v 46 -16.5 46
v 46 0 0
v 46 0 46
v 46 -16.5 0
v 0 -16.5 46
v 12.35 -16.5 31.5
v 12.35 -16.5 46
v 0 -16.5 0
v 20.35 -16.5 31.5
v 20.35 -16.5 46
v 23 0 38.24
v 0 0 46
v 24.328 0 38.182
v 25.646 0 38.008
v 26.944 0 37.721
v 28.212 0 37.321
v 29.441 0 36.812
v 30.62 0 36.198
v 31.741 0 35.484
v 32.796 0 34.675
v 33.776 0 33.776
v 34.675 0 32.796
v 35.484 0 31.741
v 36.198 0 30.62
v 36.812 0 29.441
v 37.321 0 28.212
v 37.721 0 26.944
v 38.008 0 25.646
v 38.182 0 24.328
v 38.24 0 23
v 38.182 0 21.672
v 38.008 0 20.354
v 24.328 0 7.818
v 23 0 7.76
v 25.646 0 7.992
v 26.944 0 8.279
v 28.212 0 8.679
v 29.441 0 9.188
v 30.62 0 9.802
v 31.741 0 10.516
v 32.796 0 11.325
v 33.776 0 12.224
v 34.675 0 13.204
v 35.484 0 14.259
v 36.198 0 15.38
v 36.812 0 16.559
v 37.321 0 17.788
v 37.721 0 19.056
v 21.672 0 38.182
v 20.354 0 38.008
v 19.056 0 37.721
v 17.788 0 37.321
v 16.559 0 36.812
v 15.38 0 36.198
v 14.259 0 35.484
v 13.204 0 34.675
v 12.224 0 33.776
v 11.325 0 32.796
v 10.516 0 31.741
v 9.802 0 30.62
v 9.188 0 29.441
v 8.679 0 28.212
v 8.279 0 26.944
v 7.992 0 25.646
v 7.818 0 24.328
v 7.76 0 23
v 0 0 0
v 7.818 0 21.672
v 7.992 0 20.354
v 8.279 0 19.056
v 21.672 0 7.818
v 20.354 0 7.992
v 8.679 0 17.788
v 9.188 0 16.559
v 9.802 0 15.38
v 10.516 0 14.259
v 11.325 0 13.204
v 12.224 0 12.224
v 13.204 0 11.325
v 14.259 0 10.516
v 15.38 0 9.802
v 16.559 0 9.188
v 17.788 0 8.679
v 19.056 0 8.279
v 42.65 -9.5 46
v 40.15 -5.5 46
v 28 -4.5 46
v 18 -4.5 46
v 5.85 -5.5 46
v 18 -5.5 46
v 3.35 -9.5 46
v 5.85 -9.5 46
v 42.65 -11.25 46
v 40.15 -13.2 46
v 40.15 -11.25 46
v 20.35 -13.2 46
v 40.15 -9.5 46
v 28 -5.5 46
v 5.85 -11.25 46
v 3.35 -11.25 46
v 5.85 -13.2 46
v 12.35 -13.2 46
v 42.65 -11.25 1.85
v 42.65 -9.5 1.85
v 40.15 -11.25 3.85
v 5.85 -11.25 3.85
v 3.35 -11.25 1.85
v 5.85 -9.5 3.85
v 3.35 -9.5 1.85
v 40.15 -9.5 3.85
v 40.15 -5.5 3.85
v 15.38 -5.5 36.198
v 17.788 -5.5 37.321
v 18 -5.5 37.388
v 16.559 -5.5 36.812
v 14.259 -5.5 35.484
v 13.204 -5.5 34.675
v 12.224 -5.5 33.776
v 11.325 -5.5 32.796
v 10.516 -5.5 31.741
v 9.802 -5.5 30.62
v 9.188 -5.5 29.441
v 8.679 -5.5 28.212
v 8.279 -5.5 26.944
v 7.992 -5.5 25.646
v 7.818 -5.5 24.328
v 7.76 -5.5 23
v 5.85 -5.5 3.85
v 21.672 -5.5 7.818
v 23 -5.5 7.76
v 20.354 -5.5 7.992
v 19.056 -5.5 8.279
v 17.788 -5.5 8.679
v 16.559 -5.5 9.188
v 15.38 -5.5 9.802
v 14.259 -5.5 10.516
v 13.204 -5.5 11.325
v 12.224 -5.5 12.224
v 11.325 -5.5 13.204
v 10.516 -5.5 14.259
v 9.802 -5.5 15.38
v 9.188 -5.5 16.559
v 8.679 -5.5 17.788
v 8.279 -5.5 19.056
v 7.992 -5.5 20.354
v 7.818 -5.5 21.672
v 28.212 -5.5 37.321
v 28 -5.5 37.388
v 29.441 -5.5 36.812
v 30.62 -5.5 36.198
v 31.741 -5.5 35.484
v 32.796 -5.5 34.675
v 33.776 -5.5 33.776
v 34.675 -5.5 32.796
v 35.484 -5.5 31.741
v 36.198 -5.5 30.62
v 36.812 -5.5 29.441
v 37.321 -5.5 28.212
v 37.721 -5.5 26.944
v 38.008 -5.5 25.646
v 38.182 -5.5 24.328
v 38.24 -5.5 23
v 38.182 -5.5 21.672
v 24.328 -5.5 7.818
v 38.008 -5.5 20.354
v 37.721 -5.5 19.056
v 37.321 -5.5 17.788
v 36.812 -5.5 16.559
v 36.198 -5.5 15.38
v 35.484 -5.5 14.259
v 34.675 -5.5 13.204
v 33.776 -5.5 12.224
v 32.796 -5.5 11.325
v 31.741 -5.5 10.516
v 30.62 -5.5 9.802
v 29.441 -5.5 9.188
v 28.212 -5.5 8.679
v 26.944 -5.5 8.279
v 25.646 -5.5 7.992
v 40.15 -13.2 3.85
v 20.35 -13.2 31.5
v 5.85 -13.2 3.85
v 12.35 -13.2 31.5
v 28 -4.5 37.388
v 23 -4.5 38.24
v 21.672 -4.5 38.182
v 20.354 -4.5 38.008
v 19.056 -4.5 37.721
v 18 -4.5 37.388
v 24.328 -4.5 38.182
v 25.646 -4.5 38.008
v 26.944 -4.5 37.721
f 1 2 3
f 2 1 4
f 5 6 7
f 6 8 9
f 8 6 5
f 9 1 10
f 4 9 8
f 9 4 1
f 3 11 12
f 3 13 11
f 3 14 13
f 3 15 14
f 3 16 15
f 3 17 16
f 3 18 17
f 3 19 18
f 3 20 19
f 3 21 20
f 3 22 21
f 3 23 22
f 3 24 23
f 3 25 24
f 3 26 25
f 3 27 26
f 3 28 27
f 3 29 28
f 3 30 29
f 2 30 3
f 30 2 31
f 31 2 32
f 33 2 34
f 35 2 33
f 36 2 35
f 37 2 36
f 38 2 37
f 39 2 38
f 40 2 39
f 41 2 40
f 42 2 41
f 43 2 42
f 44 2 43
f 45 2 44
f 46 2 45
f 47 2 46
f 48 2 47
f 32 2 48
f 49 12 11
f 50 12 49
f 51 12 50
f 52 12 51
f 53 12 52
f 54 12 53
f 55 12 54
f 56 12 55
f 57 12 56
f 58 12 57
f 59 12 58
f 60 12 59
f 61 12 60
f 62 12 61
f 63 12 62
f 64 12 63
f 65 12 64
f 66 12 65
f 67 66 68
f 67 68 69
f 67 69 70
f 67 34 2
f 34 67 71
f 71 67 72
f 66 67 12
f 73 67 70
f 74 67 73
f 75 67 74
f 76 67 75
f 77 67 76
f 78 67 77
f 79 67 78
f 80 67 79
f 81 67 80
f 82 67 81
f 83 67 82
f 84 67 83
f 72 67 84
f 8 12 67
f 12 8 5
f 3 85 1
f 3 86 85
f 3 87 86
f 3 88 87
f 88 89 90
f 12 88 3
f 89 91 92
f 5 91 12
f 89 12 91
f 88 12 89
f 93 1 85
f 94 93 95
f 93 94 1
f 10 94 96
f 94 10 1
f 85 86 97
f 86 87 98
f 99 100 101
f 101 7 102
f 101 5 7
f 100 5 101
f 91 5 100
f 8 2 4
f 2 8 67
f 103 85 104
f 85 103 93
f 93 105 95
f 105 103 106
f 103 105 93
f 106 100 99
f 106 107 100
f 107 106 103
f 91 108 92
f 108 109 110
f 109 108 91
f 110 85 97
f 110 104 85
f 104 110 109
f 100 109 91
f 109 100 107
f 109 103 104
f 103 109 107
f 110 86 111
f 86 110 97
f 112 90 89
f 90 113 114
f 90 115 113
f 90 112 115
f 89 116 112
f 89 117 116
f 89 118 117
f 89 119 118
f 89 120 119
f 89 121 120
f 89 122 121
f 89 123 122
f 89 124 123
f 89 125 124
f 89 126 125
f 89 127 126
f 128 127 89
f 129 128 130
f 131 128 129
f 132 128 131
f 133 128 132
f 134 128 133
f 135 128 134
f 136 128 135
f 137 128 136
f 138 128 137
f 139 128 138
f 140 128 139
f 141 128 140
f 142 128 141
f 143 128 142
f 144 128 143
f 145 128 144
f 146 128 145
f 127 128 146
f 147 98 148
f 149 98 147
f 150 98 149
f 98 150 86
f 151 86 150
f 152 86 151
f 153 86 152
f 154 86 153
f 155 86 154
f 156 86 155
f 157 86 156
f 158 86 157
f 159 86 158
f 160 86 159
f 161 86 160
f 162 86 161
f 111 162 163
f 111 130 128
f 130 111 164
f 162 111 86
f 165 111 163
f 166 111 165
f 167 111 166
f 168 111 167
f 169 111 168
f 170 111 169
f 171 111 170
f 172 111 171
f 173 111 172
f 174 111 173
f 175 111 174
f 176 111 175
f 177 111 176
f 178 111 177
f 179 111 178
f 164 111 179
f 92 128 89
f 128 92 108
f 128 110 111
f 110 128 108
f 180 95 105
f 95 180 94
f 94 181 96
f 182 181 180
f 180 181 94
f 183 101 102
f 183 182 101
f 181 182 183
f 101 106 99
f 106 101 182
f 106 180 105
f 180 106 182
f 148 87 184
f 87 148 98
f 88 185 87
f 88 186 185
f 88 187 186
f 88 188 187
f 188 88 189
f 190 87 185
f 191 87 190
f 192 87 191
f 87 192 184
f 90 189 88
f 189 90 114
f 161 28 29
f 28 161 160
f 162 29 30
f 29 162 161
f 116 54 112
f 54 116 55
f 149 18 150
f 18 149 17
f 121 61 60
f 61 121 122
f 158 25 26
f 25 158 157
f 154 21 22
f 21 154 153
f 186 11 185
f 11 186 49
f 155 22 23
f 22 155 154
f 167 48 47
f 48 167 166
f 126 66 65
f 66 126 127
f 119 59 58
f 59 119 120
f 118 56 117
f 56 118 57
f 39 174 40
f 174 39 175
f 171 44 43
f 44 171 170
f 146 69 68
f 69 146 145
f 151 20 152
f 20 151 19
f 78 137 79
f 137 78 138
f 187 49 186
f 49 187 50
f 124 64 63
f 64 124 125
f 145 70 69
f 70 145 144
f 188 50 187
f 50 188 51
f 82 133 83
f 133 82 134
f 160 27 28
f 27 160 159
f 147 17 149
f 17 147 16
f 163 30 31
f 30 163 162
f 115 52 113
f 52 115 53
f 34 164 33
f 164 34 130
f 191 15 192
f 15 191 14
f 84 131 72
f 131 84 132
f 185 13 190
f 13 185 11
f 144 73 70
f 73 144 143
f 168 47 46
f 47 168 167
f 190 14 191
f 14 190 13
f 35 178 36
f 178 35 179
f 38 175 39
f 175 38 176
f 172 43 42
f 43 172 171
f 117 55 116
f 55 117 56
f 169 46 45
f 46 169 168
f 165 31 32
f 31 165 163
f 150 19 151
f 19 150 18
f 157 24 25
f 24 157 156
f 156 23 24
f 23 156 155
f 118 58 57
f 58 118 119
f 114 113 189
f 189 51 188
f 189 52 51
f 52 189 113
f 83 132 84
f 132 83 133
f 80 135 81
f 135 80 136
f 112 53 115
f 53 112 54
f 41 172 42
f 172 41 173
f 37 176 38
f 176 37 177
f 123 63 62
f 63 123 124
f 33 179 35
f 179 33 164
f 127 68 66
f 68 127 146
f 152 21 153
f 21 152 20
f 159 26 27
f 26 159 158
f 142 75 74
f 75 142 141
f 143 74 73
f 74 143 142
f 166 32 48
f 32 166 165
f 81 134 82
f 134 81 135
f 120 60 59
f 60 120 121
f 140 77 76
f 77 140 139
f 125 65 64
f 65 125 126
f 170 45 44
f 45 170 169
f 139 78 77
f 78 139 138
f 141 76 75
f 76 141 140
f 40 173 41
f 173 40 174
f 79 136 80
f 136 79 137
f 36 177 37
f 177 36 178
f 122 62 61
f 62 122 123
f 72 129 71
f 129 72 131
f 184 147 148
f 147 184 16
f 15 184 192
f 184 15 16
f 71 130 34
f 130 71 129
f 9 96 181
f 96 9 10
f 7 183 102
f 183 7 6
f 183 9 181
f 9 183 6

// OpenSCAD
// file: BOSL2-master/threading.scad
// Minimal thread approximations for bundled gallery models.
// These preserve dimensions for preview/export without generating helical thread detail.

CENTER = [0, 0, 0];

module screw_thread(d=10, l=10, pitch=1, internal=false, anchor=CENTER) {
    center = anchor == CENTER;
    translate(center ? [0, 0, 0] : [0, 0, l / 2])
        cylinder(d=d, h=l, center=true);
}

module threaded_rod(d=10, l=10, pitch=1, internal=false, anchor=CENTER) {
    screw_thread(d=d, l=l, pitch=pitch, internal=internal, anchor=anchor);
}
// file: BOSL2-master/std.scad
// Minimal BOSL2 compatibility shim for bundled gallery models.
// It implements only the helpers used by the imported OpenSCAD projects.

CENTER = [0, 0, 0];
BOTTOM = [0, 0, -1];
TOP = [0, 0, 1];
LEFT = [-1, 0, 0];
RIGHT = [1, 0, 0];
FRONT = [0, -1, 0];
BACK = [0, 1, 0];

module up(z=0) {
    translate([0, 0, z]) children();
}

module down(z=0) {
    translate([0, 0, -z]) children();
}

module attach(anchor=CENTER) {
    children();
}

module cuboid(size=[1, 1, 1], anchor=CENTER) {
    center = anchor == CENTER;
    translate(center ? [0, 0, 0] : [0, 0, size[2] / 2])
        cube(size, center=true);
    children();
}

module xcyl(h=1, r=1, anchor=CENTER) {
    center = anchor == CENTER;
    translate(center ? [0, 0, 0] : [h / 2, 0, 0])
        rotate([0, 90, 0])
            cylinder(h=h, r=r, center=true);
}
// main file
// Adaptor to hold camera over objective lens
// Camera is the Arducam X002BU078X
// There is an old version and new version.
include <BOSL2-master/std.scad>
include <BOSL2-master/threading.scad>
$fa=5;
$fs=0.1;
width=46;// Old:40/ New: 40
length=46;// 
depth=14.5;//13.5 was the original.14.5 is the default...
cwidth=38.3;//camera board width: Old: 32.2 / New: 38.5
objdia=19.75;//nominal diameter of objective threads (20.25 first; then decrease...)
//for makerbot this is too small
rotate([90,0,0]){
difference(){
    translate([length/2,width/2,(depth+2)/2]) cuboid([length,width,depth+2],rounding=1);
//    cube([length,width,depth+2]);
    translate([(width-cwidth)/2-0.5,(width-cwidth)/2-2.0,depth-5])cube([cwidth+1,cwidth+1+10,1.75]);//board slot - new
//    translate([(width-cwidth)/2-0.5,(width-cwidth)/2-0.5,depth-5])cube([cwidth+1,cwidth+1+10,2]);//board slot - old
    translate([(width-cwidth)/2+2.0,(width-cwidth)/2,depth-9])cube([cwidth-4,cwidth+10,4]);//opening below
    translate([(width-cwidth)/2+2.0,(width-cwidth)/2,depth-3.3])cube([cwidth-4,cwidth+10,2]);//opening for electronics on top of board
    translate([width/2-5,width/2,depth-10])cube([10,width/2,2]);//opening for camera   
    translate([width/2,width/2,(depth-7)/2]) threaded_rod(d=1.2*25.4,l=depth-7,pitch=2);//Threaded opening to receive objective camera housing adapter
//    translate([width/2,width/2,0])cylinder(depth-7,d=objdia+1);//Original unthreaded opening

    translate([width/2-10.65,30.5+1.0,8])cube([8.0,20,100],center=false);//opening for usb cable connector - new only
    

}}
